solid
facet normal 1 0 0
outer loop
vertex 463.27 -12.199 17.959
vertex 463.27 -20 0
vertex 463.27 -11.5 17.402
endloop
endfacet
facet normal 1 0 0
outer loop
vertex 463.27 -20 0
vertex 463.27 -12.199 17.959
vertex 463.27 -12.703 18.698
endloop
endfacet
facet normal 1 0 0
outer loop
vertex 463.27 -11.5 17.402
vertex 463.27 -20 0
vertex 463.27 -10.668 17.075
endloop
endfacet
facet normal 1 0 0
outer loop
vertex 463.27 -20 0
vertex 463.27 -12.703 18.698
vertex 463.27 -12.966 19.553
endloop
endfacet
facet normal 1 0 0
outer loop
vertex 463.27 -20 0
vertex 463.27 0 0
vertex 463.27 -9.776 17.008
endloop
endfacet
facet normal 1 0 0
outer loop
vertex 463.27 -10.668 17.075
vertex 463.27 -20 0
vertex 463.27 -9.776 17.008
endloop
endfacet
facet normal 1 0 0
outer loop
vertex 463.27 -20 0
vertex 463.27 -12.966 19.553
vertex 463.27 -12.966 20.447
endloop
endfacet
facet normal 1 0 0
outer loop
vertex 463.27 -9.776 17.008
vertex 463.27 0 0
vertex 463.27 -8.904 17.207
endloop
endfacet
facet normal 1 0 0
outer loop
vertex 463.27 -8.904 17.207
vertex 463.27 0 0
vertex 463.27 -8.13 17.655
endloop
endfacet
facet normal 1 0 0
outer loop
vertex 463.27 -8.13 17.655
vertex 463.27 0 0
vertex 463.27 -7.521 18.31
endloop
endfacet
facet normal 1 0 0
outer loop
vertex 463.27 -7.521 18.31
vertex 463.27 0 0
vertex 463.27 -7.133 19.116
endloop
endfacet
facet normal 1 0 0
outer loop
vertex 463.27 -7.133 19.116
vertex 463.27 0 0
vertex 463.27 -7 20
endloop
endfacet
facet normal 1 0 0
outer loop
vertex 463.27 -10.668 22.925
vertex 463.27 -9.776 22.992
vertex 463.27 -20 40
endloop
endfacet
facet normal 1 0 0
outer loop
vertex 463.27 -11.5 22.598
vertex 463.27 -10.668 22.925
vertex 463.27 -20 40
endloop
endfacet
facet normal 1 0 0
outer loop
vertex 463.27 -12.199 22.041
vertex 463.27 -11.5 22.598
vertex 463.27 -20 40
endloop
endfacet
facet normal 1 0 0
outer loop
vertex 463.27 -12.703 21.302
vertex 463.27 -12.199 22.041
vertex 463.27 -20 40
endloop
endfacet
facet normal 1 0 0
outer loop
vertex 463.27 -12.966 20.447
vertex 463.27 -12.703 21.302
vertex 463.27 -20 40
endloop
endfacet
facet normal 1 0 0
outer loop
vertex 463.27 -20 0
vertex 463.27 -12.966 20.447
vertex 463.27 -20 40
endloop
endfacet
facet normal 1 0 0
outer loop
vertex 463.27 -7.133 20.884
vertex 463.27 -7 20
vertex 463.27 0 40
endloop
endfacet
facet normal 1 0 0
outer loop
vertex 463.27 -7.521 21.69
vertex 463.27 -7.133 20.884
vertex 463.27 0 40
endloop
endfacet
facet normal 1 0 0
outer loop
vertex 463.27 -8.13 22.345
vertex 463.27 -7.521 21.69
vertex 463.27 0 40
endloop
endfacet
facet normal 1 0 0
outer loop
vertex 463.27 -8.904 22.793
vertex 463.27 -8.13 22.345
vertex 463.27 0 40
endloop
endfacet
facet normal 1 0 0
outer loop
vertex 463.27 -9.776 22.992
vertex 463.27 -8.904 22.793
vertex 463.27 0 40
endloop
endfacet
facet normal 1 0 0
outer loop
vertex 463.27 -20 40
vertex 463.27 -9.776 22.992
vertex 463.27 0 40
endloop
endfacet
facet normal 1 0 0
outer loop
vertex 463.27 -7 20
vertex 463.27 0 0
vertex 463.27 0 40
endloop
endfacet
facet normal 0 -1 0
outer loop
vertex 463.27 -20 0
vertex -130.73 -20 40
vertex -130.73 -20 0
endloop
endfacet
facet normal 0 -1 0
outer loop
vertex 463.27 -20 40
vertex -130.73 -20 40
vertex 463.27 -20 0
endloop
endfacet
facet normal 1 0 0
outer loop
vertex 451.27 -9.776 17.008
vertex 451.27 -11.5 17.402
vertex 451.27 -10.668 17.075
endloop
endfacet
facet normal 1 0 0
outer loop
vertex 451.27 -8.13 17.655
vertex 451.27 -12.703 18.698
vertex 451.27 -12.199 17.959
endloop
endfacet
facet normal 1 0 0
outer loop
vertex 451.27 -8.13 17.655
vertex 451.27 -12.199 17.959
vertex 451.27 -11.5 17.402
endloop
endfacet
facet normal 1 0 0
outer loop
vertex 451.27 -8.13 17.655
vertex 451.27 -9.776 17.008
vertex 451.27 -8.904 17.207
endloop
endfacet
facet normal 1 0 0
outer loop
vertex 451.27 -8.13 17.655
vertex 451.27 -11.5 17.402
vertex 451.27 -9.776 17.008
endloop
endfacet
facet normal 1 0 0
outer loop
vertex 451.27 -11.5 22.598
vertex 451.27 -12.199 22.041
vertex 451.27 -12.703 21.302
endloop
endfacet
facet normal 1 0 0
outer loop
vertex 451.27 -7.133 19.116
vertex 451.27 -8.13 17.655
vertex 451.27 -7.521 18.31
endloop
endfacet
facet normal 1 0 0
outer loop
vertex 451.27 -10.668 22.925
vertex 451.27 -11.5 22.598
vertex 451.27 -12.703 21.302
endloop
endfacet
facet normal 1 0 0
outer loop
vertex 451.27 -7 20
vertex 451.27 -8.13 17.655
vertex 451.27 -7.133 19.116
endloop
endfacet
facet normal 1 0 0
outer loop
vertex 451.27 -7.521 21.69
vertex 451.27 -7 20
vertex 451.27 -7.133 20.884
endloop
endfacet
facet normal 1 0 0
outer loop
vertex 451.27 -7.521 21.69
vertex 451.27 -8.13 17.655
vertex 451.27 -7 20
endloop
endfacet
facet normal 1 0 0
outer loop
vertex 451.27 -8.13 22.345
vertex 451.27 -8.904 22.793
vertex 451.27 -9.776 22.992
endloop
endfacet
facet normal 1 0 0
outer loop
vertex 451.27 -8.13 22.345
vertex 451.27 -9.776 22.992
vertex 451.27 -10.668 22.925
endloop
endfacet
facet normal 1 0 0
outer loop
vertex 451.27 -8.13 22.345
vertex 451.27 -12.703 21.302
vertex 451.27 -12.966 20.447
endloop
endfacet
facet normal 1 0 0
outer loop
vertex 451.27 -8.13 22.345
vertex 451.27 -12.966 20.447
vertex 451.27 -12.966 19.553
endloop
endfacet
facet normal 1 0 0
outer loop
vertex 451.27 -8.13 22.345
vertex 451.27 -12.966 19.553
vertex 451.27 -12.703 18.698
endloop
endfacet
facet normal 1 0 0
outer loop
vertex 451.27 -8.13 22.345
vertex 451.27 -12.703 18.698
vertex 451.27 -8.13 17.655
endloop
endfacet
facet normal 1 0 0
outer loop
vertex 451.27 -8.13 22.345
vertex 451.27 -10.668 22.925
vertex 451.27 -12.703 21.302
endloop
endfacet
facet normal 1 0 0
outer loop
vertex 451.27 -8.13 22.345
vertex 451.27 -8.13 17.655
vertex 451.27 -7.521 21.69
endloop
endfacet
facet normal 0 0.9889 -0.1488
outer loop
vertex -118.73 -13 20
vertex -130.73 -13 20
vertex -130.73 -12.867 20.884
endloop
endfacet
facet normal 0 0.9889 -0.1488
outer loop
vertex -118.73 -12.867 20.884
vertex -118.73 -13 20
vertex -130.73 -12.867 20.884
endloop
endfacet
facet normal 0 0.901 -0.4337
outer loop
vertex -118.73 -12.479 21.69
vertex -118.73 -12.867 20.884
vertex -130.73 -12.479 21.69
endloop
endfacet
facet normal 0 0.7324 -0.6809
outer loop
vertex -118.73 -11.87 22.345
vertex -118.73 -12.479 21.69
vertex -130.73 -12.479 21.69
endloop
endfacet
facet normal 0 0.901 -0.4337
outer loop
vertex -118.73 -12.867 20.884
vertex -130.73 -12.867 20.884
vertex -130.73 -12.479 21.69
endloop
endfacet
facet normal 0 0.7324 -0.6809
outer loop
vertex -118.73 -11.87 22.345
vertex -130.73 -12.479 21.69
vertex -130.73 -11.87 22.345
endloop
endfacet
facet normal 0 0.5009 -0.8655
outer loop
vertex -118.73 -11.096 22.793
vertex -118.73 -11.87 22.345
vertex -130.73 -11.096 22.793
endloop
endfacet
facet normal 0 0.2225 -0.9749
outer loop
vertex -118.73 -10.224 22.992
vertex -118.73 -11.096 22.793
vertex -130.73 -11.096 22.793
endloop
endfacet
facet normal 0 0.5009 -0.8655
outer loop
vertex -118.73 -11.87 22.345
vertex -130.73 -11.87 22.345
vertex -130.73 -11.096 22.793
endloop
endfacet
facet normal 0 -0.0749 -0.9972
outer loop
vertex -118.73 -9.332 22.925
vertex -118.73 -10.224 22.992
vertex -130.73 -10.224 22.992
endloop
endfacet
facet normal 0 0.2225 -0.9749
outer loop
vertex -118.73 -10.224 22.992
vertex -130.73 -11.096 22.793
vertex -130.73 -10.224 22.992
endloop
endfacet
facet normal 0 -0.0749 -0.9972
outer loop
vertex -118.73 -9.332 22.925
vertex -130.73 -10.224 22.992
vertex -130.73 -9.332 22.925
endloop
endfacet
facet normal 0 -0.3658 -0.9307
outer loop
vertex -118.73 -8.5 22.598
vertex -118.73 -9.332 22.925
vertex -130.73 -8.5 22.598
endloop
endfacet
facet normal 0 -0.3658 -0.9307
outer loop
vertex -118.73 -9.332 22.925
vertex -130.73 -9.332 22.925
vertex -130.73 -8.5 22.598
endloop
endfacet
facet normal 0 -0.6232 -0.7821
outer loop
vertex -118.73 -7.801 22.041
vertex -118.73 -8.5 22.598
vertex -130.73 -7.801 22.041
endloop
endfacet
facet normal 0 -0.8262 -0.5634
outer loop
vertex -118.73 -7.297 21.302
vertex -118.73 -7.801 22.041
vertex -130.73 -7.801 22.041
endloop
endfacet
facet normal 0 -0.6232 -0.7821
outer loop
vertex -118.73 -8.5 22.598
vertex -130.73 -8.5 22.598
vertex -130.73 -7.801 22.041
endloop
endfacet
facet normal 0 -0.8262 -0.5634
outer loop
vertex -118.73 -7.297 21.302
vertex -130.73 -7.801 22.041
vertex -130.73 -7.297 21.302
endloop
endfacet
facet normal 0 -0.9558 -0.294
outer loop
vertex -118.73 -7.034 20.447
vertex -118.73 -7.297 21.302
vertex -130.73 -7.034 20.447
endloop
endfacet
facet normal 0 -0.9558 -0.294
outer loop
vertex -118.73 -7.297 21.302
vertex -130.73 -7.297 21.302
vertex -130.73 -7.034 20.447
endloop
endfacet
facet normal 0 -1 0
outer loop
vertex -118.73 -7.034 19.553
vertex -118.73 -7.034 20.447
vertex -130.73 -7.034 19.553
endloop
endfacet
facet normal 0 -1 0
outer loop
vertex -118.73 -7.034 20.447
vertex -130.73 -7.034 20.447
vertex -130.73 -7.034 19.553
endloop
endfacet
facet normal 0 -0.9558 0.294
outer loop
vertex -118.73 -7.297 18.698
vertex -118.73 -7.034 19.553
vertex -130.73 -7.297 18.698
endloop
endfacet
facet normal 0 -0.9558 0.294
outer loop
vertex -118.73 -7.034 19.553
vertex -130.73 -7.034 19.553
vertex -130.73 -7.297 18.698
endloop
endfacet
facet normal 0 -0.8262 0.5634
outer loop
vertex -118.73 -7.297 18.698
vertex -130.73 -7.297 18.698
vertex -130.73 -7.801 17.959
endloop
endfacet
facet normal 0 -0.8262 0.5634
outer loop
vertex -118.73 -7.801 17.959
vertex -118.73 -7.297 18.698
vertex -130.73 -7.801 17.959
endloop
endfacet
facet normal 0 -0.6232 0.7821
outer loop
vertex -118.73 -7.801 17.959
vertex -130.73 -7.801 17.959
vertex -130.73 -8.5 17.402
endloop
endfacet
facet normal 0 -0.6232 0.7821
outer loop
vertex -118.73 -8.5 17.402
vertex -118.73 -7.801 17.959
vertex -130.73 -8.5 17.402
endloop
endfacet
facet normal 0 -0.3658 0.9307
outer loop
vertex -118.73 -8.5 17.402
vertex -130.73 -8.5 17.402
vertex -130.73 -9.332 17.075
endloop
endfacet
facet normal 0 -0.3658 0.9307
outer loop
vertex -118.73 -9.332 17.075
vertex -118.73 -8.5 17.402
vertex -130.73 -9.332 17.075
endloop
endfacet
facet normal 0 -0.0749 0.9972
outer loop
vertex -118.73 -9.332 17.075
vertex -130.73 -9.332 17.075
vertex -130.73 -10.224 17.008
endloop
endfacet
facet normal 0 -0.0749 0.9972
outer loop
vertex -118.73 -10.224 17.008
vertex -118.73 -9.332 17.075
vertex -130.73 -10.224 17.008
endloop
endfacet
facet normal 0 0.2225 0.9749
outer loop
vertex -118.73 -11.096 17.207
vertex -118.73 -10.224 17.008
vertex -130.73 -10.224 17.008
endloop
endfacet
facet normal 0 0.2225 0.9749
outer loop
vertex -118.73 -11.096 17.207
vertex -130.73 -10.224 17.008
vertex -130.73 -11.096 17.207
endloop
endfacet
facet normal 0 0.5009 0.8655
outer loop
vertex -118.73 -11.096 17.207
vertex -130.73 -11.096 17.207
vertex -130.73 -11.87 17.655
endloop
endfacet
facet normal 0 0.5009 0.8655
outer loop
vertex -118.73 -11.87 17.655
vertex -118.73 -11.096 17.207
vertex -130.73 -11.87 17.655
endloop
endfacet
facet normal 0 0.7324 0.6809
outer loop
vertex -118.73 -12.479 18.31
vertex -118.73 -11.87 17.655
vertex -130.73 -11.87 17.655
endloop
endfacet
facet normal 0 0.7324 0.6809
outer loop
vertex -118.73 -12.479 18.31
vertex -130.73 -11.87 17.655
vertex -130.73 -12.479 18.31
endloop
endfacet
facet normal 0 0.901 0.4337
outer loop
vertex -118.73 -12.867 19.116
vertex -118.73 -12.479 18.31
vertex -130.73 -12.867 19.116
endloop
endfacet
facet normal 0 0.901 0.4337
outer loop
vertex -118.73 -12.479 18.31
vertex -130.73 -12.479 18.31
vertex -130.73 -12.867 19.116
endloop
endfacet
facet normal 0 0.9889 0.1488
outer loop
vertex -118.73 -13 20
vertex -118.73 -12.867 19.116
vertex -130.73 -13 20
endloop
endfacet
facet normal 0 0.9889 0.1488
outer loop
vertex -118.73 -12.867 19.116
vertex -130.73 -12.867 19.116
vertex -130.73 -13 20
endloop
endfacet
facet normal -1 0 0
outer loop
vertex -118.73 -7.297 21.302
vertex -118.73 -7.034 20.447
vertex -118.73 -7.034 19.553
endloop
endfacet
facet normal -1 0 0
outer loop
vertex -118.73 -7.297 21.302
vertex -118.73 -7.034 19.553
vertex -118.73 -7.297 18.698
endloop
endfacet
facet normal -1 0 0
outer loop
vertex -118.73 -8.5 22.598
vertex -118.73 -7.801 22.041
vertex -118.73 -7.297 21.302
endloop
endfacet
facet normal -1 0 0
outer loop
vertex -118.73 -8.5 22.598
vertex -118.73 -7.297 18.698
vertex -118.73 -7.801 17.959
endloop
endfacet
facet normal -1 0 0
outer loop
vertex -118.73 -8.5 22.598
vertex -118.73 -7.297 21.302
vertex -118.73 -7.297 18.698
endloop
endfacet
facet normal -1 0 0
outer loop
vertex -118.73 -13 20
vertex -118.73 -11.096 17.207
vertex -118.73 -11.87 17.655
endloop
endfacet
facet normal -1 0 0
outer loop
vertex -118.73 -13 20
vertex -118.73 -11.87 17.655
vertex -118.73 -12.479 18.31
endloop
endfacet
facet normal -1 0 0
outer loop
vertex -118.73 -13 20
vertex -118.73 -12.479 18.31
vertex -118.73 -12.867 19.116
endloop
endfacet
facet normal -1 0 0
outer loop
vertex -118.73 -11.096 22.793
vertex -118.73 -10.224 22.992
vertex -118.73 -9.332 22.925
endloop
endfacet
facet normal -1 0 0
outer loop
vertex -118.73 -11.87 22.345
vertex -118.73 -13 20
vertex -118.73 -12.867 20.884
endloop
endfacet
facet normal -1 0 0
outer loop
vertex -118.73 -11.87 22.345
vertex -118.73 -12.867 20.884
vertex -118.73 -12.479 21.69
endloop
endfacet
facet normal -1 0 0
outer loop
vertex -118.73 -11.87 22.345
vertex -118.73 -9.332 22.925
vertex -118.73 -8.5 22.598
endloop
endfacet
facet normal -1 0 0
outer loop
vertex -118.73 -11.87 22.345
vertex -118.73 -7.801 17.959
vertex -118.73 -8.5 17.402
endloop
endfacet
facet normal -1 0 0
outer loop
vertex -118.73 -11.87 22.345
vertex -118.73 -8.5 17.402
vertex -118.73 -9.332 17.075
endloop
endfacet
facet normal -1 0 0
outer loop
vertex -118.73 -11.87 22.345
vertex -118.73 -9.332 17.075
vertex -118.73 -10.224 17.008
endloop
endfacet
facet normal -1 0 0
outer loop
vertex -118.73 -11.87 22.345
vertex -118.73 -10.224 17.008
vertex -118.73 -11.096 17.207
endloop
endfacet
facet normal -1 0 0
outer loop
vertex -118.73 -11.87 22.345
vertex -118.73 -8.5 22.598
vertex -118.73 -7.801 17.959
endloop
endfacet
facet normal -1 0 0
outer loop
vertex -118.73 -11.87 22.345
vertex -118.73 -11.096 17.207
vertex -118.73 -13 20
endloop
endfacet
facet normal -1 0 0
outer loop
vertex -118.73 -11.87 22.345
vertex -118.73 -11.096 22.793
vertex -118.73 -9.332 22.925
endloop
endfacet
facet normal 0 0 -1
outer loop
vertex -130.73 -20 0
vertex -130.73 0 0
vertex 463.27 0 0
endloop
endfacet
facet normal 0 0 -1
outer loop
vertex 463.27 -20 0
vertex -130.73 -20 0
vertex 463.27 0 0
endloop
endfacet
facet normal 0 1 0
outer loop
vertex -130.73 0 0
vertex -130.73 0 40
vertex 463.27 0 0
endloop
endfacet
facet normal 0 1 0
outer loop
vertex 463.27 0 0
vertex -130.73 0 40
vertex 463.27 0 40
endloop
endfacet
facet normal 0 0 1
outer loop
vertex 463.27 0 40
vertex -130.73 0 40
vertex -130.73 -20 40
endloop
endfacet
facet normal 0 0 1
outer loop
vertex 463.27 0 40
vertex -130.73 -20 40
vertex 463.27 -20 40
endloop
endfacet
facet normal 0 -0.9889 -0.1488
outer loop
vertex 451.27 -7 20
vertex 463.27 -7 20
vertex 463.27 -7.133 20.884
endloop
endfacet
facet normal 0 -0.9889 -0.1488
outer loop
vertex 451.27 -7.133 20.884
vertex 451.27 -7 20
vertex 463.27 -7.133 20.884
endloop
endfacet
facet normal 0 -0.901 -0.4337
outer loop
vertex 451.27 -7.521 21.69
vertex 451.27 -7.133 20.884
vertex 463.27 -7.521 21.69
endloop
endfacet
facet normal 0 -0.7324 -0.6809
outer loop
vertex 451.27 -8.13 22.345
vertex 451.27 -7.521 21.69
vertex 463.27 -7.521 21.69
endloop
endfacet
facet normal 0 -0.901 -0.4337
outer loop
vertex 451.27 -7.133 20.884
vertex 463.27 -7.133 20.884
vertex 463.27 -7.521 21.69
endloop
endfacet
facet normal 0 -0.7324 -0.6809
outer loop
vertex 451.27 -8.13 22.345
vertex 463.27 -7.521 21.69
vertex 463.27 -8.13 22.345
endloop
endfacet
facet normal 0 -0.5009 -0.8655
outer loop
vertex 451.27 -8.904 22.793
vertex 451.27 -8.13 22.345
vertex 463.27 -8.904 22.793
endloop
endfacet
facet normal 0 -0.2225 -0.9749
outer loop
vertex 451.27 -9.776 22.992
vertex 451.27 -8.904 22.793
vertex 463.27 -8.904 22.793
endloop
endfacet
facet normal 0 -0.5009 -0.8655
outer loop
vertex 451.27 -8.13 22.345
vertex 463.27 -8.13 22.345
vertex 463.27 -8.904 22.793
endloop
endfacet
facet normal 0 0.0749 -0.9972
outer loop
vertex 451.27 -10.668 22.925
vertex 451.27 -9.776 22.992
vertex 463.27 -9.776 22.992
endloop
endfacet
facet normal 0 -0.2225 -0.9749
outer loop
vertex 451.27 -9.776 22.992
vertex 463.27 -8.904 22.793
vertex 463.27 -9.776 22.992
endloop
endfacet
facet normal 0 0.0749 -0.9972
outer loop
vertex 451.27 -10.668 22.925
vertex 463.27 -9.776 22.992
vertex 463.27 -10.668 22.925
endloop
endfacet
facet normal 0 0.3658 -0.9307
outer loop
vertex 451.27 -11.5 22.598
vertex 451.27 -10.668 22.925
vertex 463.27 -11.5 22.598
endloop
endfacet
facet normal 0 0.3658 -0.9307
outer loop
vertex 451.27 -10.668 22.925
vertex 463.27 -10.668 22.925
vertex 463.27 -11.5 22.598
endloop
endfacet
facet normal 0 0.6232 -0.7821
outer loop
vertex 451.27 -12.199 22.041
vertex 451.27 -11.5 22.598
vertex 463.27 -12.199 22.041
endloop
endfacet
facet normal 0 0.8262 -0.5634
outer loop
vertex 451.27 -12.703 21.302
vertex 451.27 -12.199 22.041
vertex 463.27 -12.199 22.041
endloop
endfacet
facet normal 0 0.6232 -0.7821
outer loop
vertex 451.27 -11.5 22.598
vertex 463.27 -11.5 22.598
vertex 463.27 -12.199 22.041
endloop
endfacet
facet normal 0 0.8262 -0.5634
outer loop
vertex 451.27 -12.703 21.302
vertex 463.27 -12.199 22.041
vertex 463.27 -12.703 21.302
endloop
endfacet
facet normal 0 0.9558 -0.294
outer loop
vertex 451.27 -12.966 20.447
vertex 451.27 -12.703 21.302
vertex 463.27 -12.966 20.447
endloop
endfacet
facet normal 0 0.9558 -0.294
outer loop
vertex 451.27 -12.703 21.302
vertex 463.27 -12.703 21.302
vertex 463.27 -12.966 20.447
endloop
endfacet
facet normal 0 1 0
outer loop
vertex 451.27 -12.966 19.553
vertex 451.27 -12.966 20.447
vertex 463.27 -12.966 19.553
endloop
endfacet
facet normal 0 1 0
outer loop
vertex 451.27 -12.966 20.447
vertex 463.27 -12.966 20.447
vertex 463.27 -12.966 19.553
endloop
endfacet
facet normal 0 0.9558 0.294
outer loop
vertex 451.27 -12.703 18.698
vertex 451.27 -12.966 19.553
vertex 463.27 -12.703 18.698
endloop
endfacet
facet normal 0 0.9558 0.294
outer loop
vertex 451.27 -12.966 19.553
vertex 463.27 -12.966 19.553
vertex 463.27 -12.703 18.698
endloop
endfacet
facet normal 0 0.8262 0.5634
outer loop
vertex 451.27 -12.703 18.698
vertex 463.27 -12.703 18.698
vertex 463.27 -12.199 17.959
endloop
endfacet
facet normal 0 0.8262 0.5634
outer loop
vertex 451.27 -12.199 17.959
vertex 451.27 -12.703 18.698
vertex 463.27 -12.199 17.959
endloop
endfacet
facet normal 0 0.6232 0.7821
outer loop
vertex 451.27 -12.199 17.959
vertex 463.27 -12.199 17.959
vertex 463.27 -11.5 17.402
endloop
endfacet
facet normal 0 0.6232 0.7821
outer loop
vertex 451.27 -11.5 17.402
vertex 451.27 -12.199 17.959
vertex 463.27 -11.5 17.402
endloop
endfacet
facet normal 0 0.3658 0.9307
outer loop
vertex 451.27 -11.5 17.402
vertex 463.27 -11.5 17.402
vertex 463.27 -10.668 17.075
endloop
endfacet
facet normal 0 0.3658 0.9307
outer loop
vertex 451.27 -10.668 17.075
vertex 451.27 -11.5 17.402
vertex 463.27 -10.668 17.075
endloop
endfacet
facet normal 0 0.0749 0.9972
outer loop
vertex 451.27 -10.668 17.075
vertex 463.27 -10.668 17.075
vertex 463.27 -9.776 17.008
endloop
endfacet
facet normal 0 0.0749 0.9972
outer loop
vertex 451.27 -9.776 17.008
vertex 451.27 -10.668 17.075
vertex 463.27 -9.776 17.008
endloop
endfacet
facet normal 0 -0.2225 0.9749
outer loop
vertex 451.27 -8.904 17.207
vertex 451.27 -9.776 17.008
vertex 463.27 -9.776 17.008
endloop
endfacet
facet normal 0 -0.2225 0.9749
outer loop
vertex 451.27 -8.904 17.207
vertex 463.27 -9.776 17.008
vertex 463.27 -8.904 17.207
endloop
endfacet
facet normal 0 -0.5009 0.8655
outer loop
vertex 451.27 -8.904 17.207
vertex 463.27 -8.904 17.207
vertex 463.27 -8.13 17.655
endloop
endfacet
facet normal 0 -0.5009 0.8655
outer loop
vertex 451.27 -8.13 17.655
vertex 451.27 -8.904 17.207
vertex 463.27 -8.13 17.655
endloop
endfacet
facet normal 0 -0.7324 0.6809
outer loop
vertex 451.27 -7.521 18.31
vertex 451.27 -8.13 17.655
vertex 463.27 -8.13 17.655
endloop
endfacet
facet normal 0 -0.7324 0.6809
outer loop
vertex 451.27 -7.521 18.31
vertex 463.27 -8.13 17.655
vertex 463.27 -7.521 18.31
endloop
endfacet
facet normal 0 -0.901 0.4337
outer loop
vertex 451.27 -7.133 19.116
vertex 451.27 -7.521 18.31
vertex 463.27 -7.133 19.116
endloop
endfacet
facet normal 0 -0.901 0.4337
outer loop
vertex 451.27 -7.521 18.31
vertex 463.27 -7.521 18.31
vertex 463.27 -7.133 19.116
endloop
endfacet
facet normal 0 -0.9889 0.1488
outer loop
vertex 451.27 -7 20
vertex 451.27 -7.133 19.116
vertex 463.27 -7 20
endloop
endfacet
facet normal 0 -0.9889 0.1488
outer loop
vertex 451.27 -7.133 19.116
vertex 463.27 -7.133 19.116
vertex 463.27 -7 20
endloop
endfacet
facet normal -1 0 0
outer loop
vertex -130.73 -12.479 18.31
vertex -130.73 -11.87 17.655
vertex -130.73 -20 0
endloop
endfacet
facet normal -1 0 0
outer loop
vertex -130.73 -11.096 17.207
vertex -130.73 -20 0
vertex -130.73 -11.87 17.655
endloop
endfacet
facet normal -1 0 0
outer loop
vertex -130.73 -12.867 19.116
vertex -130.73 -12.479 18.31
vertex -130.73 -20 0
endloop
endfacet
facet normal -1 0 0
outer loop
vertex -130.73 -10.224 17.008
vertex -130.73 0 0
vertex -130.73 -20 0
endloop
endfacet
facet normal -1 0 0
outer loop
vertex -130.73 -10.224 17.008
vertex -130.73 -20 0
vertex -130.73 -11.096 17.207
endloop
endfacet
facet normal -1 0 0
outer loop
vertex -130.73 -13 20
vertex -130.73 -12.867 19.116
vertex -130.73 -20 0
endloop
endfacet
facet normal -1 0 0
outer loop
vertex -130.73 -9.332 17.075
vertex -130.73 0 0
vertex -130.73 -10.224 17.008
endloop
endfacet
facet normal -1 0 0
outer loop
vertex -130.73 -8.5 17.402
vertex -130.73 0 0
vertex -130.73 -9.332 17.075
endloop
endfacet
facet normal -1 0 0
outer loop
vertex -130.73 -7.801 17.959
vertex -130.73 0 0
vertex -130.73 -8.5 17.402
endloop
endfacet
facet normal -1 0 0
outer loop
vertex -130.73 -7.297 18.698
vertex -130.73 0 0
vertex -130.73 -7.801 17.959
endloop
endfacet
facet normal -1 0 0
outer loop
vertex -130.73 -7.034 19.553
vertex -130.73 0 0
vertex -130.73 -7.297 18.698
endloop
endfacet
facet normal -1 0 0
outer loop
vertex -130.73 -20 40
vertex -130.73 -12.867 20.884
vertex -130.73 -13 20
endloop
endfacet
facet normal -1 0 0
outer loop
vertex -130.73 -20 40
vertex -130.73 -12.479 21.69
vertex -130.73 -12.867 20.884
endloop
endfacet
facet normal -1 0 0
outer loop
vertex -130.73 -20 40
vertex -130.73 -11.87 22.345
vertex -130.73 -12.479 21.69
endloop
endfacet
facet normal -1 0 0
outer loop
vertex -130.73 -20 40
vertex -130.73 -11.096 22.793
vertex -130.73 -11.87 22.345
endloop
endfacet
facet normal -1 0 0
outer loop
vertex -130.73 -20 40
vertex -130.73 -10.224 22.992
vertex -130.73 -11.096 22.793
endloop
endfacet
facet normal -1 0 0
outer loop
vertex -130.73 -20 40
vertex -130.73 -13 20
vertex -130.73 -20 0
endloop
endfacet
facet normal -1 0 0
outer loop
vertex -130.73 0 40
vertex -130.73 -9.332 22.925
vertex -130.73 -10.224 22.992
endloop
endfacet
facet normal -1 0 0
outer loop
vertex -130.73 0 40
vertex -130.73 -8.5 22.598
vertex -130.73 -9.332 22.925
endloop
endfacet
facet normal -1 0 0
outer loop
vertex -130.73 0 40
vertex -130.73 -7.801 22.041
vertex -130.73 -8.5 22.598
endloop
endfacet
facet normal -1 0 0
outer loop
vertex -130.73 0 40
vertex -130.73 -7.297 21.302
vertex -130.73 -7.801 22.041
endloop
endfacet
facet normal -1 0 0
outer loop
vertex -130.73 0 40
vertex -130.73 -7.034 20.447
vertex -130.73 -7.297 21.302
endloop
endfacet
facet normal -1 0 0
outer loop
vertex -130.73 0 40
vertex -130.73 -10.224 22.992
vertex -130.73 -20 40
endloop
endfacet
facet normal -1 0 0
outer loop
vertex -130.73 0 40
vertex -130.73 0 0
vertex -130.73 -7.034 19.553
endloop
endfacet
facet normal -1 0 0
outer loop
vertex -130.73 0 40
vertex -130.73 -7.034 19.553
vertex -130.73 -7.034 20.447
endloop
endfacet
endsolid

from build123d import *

# Parameters (mm, degrees)
F0_W     = 594
F0_H     = 40
F1_DEPTH = 20
F2_R     = 3
F3_DEPTH = 12
F4_R     = 3
F5_DEPTH = 12


with BuildPart() as f1:
    # F0 (on Front) → F1 (new body)
    with BuildSketch(Plane.XZ):
        with Locations((166.269565, 20)):
            Rectangle(F0_W, F0_H)
    extrude(amount=F1_DEPTH)

    # F2 (on face) → F3 (cut)
    with BuildSketch(Plane.YZ.offset(463.269565)):
        with Locations((-10, 20)):
            Circle(F2_R)
    extrude(amount=-F3_DEPTH, mode=Mode.SUBTRACT)

    # F4 (on face) → F5 (cut)
    with BuildSketch(Plane(origin=(-130.730435, 0, 0), x_dir=(0, -1, 0), z_dir=(-1, 0, 0))):
        with Locations((10, 20)):
            Circle(F4_R)
    extrude(amount=-F5_DEPTH, mode=Mode.SUBTRACT)


solid = f1.part
